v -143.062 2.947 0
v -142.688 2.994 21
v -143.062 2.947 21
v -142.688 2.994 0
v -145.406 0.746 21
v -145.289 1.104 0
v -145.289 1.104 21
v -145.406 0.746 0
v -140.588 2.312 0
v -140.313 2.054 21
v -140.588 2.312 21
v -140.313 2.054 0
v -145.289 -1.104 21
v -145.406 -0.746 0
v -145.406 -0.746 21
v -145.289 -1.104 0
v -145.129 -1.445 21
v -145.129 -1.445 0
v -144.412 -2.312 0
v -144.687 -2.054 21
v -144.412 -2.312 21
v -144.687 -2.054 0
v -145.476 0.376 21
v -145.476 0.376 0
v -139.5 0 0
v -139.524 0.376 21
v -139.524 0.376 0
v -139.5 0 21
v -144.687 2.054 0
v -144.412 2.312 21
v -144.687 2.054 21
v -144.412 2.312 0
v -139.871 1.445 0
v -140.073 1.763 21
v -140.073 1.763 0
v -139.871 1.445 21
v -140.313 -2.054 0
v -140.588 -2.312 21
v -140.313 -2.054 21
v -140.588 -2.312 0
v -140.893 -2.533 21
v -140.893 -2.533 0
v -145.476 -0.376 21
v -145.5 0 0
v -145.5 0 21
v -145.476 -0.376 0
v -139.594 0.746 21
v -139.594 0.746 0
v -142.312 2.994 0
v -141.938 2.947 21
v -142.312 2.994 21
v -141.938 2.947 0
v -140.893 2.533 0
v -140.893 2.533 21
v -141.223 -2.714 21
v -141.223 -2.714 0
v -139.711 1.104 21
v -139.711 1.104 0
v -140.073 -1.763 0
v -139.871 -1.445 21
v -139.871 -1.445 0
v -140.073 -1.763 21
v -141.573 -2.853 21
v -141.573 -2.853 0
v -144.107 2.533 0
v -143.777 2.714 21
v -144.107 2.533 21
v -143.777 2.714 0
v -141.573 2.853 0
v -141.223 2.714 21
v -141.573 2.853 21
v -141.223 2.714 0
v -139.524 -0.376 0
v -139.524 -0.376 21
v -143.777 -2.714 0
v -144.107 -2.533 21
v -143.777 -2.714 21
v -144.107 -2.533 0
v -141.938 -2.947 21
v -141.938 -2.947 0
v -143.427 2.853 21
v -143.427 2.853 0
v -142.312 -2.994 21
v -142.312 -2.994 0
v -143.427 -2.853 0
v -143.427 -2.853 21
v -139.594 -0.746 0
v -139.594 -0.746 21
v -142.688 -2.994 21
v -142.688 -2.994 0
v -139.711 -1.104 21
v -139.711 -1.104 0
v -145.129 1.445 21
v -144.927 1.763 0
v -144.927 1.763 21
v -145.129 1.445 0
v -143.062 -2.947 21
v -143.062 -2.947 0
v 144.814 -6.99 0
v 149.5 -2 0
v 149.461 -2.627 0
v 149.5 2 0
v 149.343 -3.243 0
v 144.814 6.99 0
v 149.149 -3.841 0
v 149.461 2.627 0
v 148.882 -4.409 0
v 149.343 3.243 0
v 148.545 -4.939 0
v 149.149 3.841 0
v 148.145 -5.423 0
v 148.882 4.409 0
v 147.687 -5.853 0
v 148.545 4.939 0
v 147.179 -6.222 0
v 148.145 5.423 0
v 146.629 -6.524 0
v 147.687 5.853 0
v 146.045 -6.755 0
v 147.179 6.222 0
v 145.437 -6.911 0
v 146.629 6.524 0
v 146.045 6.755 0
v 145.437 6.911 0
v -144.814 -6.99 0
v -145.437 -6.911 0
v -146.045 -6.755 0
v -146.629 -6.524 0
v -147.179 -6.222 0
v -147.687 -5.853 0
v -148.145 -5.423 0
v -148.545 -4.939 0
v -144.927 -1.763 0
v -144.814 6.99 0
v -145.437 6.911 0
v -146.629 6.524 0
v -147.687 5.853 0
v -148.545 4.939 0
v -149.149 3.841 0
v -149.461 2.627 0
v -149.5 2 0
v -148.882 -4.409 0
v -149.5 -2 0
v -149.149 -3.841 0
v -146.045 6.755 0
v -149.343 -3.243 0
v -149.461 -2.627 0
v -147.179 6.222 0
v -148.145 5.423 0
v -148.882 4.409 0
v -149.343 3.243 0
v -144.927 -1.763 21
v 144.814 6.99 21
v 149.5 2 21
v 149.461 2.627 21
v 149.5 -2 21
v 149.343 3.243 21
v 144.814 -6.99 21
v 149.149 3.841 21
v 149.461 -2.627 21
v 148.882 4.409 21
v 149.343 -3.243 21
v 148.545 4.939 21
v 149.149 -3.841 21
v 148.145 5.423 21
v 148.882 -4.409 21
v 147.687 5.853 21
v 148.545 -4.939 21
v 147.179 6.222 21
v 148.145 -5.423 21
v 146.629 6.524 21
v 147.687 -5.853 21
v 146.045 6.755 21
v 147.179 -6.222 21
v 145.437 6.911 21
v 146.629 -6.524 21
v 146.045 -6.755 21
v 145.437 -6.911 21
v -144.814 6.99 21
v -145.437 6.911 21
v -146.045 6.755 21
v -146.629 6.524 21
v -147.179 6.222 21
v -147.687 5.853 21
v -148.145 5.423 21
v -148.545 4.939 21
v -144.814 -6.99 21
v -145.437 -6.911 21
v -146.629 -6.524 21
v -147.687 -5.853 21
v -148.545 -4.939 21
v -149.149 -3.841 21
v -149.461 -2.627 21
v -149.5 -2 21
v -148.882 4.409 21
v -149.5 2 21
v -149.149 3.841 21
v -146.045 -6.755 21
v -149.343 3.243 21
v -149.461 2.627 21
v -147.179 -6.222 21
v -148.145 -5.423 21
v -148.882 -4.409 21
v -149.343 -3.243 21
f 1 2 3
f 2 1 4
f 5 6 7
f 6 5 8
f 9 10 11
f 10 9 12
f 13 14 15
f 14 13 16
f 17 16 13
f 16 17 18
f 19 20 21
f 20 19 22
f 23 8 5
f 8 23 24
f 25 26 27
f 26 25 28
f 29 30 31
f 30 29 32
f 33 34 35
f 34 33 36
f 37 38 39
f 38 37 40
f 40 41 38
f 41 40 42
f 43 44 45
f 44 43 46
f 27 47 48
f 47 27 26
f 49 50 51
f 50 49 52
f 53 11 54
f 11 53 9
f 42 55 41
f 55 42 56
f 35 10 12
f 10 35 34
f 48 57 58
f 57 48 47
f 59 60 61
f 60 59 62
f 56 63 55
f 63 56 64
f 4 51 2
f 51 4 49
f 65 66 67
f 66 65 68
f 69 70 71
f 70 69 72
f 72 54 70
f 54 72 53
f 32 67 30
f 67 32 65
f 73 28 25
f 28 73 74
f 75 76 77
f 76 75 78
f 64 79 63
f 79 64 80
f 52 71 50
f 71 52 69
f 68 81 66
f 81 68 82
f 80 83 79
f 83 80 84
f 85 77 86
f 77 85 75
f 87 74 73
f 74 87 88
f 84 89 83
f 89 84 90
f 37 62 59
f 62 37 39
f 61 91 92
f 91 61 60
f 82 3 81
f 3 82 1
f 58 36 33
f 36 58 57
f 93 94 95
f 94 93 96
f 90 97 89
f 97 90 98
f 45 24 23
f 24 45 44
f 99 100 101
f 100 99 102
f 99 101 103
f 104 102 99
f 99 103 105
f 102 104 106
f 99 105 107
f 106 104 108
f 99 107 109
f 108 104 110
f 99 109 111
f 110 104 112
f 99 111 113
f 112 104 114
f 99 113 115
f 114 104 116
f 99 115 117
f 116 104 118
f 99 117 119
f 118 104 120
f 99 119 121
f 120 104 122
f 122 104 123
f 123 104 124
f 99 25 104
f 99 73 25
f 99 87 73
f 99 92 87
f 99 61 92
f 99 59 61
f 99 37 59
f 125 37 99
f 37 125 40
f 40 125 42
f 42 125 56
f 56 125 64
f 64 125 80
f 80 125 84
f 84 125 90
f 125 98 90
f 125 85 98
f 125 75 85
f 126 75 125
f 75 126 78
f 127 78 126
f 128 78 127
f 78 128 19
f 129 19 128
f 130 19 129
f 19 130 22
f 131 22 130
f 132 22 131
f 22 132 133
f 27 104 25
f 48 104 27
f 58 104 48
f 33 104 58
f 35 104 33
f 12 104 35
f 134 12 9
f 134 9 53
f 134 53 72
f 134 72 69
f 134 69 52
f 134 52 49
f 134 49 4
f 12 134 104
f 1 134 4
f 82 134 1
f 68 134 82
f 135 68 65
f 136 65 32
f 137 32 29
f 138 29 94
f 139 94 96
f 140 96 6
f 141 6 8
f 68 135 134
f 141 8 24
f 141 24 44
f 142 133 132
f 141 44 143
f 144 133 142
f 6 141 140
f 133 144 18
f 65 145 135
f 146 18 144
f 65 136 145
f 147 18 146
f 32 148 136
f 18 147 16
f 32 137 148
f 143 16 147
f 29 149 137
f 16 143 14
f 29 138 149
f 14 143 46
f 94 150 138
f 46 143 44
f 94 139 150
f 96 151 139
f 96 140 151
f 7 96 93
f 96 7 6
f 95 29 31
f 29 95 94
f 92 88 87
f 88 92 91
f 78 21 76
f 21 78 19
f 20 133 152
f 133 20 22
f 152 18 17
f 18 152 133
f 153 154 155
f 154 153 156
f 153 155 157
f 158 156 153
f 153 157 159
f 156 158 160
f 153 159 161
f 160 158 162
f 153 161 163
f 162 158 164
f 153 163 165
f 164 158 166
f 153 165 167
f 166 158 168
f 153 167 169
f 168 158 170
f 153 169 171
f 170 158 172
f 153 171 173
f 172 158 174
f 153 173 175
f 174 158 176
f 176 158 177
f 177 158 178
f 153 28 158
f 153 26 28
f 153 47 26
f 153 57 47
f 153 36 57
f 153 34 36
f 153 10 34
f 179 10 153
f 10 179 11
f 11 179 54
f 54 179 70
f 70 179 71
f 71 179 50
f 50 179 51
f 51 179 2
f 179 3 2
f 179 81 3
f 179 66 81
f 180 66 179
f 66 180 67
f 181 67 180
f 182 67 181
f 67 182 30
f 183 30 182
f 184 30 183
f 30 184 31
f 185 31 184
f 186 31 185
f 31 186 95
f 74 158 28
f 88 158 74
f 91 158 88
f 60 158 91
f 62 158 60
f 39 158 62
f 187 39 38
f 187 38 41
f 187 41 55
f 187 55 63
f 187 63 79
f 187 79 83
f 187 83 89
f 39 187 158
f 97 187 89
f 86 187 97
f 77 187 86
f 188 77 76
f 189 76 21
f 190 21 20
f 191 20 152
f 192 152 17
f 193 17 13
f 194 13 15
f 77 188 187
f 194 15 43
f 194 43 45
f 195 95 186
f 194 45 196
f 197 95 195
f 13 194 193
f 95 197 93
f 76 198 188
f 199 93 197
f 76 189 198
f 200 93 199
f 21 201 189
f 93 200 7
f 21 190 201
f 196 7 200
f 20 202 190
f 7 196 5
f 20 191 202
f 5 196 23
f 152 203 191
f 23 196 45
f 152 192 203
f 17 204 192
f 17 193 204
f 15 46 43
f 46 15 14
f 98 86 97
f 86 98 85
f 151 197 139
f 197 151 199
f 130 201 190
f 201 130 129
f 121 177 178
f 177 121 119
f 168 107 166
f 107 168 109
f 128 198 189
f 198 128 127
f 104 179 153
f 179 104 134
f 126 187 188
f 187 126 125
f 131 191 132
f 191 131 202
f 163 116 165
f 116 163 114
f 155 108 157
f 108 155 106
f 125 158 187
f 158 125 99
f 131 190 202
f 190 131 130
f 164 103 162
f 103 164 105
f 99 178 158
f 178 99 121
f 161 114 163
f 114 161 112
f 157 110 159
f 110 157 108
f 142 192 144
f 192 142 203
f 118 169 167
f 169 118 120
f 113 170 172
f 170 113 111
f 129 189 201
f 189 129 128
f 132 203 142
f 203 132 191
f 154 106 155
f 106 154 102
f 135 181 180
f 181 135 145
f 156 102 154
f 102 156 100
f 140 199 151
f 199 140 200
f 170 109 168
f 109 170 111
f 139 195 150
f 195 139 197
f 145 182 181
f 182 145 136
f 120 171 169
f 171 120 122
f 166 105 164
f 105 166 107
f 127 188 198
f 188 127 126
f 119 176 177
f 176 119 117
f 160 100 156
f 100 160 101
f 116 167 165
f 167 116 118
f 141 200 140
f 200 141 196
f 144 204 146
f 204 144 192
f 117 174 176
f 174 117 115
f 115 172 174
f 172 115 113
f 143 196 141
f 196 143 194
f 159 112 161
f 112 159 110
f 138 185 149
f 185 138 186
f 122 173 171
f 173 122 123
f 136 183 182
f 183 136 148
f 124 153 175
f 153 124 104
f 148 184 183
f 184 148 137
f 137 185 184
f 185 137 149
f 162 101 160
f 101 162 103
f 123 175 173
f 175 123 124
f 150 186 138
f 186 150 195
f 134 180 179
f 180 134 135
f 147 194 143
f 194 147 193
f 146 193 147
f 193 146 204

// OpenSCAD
$fn = 50;


difference() {
	union() {
		hull() {
			translate(v = [-144.5000000000, 2.0000000000, 0]) {
				cylinder(h = 21, r = 5);
			}
			translate(v = [144.5000000000, 2.0000000000, 0]) {
				cylinder(h = 21, r = 5);
			}
			translate(v = [-144.5000000000, -2.0000000000, 0]) {
				cylinder(h = 21, r = 5);
			}
			translate(v = [144.5000000000, -2.0000000000, 0]) {
				cylinder(h = 21, r = 5);
			}
		}
	}
	union() {
		translate(v = [-142.5000000000, 0.0000000000, 0]) {
			cylinder(h = 21, r = 3.0000000000);
		}
		translate(v = [-142.5000000000, 0.0000000000, 0]) {
			cylinder(h = 21, r = 1.5000000000);
		}
		translate(v = [-142.5000000000, 0.0000000000, 0]) {
			cylinder(h = 21, r = 1.5000000000);
		}
		translate(v = [-142.5000000000, 0.0000000000, 0]) {
			cylinder(h = 21, r = 1.5000000000);
		}
	}
}
